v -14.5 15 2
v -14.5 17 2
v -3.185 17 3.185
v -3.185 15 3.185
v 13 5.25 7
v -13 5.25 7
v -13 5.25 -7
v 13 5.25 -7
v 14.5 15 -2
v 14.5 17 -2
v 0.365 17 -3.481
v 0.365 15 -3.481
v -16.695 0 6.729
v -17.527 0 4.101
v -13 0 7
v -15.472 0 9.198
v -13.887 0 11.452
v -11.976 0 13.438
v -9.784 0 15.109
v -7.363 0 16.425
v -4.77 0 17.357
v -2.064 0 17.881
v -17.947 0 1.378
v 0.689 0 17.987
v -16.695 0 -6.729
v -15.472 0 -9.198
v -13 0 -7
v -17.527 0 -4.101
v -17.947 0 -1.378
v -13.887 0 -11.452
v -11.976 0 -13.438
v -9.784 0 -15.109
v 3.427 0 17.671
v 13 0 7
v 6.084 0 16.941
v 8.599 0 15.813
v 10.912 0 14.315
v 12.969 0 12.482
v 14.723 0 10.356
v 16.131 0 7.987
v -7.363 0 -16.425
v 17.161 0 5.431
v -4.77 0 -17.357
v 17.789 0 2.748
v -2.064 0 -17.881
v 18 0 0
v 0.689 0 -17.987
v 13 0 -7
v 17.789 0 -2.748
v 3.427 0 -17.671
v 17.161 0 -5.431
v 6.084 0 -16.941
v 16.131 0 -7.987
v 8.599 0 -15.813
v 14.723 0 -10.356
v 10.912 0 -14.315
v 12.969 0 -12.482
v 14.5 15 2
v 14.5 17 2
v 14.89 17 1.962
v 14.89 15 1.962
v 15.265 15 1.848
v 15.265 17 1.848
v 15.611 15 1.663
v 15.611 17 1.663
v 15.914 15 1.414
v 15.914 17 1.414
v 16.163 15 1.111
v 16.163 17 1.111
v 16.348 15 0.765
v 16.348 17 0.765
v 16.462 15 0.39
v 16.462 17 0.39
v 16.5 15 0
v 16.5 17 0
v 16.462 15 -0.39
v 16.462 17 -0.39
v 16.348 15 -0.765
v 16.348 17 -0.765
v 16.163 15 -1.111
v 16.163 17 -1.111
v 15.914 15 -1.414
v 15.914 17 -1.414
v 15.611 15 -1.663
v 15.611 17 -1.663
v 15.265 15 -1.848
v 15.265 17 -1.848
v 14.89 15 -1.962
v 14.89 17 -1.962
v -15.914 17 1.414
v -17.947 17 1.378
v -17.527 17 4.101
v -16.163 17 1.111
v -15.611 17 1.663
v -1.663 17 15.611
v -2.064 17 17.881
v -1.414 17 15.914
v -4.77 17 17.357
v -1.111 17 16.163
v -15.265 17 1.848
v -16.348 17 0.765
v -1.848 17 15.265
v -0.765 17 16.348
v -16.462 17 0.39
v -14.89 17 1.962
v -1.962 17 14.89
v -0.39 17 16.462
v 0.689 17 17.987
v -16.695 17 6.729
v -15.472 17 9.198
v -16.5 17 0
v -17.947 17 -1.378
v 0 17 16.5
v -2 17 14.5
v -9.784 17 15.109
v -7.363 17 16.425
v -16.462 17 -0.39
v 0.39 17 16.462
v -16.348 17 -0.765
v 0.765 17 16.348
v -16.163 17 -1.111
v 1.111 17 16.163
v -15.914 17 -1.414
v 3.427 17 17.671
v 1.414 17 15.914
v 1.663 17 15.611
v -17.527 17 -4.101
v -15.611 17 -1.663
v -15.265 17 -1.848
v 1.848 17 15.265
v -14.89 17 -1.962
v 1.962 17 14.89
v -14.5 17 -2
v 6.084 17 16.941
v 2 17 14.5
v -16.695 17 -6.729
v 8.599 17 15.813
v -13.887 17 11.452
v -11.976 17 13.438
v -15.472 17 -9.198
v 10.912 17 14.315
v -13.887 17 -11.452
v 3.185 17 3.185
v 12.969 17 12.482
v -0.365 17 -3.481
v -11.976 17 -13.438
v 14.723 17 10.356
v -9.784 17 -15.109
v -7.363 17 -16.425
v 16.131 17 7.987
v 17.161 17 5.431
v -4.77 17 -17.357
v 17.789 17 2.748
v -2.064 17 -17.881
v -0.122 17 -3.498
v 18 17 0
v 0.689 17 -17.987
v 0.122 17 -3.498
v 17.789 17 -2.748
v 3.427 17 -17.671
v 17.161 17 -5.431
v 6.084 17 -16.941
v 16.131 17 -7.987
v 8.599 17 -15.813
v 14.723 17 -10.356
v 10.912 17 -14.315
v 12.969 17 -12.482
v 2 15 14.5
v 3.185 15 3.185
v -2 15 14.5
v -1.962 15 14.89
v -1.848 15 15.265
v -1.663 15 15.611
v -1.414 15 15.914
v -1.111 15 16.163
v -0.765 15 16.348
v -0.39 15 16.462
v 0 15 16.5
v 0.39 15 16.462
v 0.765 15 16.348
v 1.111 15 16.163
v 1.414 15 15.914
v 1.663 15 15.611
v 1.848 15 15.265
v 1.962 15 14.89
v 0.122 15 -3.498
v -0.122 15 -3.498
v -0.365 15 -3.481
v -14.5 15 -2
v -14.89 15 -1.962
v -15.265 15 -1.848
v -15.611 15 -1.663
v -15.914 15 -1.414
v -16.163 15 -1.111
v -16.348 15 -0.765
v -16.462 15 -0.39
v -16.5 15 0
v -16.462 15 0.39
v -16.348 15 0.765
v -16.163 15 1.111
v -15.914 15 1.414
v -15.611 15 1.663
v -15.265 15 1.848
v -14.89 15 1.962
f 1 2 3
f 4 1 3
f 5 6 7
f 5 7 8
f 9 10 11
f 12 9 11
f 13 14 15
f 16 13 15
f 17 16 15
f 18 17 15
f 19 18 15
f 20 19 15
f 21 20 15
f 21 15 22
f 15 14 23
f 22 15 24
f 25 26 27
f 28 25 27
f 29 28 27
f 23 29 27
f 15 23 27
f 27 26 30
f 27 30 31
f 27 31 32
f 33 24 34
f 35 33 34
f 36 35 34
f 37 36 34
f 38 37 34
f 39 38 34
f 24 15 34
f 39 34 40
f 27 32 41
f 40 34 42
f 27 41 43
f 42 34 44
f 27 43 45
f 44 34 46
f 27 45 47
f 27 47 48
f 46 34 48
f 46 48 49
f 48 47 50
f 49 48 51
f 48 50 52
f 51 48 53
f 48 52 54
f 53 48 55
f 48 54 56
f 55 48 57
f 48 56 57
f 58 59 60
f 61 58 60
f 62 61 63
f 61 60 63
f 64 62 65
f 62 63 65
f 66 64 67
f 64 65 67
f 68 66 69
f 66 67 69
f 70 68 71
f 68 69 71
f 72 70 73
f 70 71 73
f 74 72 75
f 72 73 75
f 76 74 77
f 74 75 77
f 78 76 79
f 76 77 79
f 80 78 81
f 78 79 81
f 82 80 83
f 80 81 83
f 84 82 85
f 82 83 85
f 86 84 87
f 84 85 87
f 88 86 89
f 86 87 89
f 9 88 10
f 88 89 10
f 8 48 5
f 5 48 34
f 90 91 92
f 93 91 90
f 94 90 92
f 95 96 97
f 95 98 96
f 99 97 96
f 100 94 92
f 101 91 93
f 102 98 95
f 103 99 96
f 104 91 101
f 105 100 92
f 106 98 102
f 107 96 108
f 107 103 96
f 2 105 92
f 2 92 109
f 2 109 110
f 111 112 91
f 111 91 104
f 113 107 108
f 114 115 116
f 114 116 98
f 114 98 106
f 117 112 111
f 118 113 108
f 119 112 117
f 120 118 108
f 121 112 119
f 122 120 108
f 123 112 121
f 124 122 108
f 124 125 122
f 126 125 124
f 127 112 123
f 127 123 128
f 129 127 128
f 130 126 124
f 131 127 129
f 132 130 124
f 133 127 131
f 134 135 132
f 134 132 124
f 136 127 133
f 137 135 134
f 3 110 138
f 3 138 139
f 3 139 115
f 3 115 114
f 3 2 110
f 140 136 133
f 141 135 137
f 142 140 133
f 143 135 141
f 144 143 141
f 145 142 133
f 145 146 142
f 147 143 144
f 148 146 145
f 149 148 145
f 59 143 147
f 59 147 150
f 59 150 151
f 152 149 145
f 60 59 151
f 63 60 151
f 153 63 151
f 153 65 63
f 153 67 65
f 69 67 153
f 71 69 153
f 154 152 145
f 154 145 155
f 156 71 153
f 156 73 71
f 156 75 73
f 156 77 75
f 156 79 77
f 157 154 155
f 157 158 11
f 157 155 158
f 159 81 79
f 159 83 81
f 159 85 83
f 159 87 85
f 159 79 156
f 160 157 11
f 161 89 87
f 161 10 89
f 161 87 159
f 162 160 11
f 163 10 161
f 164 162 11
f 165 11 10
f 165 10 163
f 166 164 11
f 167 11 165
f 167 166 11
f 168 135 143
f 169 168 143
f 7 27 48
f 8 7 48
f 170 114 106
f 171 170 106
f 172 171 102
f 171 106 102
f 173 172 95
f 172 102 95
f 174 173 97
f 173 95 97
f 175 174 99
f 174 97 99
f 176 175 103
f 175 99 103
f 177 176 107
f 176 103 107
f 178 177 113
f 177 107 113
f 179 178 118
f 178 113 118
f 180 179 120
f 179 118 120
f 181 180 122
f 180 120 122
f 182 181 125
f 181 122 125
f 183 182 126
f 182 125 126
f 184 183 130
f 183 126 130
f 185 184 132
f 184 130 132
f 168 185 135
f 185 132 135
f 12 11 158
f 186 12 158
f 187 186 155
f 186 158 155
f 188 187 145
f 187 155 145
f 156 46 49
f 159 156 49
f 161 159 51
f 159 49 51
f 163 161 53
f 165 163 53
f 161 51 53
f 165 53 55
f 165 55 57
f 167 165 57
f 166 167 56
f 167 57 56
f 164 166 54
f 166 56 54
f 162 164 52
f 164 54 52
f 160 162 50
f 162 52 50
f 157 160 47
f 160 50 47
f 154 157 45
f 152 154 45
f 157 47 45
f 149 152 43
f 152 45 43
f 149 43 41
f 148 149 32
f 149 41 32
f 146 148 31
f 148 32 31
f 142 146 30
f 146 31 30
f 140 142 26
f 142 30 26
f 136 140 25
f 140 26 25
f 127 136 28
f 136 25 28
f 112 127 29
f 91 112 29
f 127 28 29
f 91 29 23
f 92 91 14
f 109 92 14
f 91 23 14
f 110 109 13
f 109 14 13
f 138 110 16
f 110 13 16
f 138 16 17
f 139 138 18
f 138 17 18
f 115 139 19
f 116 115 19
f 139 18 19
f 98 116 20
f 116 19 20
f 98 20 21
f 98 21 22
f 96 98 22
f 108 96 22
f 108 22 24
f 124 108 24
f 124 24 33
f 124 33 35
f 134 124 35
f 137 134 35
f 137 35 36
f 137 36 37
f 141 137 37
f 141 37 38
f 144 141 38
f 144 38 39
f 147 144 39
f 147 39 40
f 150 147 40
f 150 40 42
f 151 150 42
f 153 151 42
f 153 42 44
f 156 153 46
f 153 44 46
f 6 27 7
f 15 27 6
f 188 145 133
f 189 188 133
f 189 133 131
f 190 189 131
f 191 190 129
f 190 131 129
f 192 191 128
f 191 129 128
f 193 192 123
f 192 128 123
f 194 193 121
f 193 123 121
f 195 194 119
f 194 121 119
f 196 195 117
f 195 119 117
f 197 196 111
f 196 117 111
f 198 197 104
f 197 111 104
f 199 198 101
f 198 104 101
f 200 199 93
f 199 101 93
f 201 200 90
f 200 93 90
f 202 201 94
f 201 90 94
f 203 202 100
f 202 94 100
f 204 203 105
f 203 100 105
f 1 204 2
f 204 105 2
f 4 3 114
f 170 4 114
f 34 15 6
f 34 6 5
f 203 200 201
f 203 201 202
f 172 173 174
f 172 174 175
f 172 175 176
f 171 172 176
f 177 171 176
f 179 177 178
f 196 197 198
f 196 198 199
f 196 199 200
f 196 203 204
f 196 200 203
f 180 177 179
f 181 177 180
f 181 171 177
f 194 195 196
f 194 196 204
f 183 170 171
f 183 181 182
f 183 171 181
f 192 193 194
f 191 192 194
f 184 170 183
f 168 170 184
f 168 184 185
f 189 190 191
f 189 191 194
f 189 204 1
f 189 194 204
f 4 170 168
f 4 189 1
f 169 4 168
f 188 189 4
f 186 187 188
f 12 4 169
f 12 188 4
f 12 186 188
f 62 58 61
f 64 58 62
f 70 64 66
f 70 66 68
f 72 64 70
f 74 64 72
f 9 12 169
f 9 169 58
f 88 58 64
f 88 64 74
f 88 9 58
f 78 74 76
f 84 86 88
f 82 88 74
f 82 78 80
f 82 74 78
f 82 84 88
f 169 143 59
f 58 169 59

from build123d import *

# Parameters (mm, degrees)
SKETCH1_R           = 18
BOSS_EXTRUDE1_DEPTH = 17
SKETCH2_W           = 26
SKETCH2_H           = 14
CUT_EXTRUDE1_DEPTH  = 5.25
CUT_EXTRUDE2_DEPTH  = 2


with BuildPart() as part:
    # Sketch1 → Boss-Extrude1 (new body)
    with BuildSketch(Plane(origin=(0, 0, 0), x_dir=(1, 0, 0), z_dir=(0, 1, 0))):
        Circle(SKETCH1_R)
    extrude(amount=BOSS_EXTRUDE1_DEPTH)

    # Sketch2 → Cut-Extrude1 (cut)
    with BuildSketch(Plane.XZ):
        Rectangle(SKETCH2_W, SKETCH2_H)
    extrude(amount=-CUT_EXTRUDE1_DEPTH, mode=Mode.SUBTRACT)

    # Sketch3 → Cut-Extrude2 (cut)
    with BuildSketch(Plane(origin=(0, 17, 0), x_dir=(1, 0, 0), z_dir=(0, 1, 0))):
        with BuildLine():
            Line((14.5, 2), (0.364696883, 3.480947599))
            ThreePointArc((0.364696883, 3.480947599), (0, 3.5), (-0.364696883, 3.480947599))
            Line((-0.364696883, 3.480947599), (-14.5, 2))
            ThreePointArc((-14.5, 2), (-16.5, 0), (-14.5, -2))
            Line((-14.5, -2), (-3.185421861, -3.185421861))
            Line((-3.185421861, -3.185421861), (-2, -14.5))
            ThreePointArc((-2, -14.5), (0, -16.5), (2, -14.5))
            Line((2, -14.5), (3.185421861, -3.185421861))
            Line((3.185421861, -3.185421861), (14.5, -2))
            ThreePointArc((14.5, -2), (16.5, 0), (14.5, 2))
        make_face()
    extrude(amount=-CUT_EXTRUDE2_DEPTH, mode=Mode.SUBTRACT)


solid = part.part
